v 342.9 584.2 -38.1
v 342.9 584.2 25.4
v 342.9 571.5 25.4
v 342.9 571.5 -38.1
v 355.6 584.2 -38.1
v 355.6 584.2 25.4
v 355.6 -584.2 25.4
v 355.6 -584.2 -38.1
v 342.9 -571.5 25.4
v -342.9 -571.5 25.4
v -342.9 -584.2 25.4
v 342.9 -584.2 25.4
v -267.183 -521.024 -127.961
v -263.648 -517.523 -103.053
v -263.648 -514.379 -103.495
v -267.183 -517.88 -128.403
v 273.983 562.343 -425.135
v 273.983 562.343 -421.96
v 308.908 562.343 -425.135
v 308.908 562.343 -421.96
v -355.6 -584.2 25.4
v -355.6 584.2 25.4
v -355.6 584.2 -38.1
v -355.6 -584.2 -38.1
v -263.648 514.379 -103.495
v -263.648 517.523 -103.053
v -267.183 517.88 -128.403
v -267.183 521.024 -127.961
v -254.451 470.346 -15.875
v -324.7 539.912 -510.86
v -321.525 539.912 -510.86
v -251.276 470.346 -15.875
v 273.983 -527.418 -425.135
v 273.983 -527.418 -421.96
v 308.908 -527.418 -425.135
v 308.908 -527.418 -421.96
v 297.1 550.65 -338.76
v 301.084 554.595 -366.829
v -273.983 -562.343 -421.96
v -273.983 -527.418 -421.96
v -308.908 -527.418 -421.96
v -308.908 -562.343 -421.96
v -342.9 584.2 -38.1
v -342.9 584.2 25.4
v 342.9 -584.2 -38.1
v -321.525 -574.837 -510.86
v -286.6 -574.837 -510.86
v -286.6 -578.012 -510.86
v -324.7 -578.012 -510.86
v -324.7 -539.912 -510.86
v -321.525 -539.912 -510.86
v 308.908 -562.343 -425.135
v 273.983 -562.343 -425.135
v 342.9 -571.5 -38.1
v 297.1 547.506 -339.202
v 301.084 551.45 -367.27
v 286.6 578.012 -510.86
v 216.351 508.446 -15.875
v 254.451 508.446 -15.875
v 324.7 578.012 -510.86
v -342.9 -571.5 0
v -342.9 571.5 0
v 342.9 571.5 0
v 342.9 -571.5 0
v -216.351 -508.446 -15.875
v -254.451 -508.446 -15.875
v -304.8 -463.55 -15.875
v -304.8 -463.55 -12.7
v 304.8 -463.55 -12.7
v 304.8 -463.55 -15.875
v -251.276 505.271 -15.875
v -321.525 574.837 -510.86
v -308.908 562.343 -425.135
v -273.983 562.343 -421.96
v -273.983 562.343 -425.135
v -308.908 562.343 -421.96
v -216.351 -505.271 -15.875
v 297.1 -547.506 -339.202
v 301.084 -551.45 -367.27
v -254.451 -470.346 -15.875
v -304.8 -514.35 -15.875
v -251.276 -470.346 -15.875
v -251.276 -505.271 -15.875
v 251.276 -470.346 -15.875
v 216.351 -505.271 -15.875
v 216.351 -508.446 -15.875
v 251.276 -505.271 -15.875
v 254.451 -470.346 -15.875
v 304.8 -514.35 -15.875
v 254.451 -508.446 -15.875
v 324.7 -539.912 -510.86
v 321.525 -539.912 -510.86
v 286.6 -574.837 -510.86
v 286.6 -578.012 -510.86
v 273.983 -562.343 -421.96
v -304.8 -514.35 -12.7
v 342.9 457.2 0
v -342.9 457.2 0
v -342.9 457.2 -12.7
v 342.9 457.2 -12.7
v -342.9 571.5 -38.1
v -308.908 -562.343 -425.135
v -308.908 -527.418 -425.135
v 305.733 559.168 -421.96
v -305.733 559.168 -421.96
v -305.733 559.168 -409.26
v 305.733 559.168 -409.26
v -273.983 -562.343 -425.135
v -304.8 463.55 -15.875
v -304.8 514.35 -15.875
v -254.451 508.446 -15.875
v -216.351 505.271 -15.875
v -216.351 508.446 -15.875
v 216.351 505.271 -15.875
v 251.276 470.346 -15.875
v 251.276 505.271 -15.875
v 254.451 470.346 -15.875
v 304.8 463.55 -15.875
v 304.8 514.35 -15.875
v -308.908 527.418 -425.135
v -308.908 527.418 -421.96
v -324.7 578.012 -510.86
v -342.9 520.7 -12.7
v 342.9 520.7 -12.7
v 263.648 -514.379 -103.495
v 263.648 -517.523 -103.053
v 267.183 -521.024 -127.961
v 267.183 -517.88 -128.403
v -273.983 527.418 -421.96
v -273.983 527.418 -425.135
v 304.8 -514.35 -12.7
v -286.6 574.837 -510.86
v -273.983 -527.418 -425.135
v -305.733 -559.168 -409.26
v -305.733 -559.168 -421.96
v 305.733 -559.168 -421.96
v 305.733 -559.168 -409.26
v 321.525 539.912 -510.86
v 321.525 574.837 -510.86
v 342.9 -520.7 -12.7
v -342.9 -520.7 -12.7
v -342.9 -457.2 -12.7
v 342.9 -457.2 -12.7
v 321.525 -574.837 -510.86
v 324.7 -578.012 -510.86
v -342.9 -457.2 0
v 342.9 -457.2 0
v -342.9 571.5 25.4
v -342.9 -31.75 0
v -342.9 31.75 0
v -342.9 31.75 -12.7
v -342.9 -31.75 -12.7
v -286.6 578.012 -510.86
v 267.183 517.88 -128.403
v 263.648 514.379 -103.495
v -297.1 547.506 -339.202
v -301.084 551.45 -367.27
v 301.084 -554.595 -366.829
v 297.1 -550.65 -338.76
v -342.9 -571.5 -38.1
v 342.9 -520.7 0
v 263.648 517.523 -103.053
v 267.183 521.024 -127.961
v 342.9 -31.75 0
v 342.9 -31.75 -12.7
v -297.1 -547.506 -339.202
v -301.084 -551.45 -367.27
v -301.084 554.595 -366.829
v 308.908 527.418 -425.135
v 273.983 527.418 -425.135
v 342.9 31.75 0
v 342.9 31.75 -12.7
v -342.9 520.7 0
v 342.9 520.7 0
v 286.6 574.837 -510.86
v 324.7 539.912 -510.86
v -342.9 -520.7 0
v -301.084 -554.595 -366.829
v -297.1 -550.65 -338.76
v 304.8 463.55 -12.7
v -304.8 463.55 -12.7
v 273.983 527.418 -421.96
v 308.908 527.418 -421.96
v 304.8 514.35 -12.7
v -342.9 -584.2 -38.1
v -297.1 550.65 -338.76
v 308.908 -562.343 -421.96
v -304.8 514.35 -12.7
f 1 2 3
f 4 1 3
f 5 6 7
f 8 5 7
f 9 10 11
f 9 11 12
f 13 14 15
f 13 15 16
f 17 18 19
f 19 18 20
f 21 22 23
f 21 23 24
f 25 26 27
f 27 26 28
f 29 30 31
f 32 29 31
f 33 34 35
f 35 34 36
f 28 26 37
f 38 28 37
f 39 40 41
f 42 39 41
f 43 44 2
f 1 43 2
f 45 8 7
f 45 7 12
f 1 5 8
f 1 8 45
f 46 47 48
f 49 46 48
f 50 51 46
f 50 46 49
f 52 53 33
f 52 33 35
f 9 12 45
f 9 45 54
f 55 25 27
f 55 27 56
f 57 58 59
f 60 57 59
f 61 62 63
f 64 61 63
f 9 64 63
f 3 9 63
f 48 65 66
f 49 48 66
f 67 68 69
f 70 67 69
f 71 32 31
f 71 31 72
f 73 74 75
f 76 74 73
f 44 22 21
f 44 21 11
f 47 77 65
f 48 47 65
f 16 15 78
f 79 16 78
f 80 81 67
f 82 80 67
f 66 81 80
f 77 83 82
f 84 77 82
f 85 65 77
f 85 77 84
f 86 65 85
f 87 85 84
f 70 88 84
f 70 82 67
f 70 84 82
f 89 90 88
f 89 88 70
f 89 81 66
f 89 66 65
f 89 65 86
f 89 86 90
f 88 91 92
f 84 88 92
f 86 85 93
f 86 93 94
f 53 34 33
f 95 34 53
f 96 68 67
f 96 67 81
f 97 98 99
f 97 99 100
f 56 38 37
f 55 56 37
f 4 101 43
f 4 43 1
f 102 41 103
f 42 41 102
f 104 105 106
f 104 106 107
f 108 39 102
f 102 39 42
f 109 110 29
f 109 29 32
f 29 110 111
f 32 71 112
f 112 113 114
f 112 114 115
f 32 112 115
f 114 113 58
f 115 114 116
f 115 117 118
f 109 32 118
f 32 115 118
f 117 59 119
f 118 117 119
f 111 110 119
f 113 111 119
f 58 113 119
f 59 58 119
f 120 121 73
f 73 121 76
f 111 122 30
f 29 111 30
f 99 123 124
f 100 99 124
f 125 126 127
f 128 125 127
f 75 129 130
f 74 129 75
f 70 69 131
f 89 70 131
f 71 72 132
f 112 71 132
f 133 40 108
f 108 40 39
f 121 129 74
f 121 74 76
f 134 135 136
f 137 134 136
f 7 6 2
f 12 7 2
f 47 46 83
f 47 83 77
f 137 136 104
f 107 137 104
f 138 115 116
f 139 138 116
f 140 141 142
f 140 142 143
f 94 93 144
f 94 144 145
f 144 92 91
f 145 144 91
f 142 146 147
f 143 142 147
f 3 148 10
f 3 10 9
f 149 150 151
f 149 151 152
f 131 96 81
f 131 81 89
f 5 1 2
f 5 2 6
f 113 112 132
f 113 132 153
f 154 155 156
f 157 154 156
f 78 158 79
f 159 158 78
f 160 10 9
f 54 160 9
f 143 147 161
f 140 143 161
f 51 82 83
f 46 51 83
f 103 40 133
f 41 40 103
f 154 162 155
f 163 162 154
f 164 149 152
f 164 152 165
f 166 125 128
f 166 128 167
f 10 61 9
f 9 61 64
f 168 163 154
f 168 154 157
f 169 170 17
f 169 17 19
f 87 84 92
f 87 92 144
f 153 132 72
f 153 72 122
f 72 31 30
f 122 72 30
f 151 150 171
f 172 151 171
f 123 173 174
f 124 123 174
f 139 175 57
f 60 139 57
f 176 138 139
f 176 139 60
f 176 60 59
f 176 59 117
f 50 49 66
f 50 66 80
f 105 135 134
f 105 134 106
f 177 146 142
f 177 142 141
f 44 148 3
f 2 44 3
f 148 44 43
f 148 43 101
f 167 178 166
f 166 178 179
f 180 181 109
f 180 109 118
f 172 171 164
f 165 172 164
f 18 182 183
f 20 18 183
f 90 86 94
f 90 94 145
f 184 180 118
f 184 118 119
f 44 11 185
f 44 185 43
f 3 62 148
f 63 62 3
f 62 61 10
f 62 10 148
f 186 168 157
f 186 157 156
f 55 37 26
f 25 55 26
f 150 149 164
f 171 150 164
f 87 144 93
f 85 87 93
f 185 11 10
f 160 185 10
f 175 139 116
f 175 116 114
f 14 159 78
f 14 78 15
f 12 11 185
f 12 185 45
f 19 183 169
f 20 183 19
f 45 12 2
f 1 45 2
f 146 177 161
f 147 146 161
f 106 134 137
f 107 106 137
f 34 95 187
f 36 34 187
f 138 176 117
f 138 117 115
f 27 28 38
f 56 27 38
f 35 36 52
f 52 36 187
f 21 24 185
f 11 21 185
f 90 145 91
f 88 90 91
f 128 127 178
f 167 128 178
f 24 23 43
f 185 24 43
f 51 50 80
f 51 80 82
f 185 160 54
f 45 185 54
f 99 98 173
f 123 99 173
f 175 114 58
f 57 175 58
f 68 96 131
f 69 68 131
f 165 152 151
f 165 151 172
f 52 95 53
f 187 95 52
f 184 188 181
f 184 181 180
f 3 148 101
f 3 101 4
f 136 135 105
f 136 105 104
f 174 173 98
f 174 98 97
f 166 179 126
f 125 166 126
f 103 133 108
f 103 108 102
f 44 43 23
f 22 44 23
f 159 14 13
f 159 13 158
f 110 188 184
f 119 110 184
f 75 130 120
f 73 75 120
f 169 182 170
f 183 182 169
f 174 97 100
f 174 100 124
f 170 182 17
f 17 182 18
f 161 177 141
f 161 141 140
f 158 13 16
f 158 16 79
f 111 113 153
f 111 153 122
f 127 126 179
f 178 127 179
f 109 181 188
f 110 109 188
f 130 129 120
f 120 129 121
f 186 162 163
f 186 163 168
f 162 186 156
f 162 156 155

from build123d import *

# Parameters (mm, degrees)
F0_W      = 685.8
F0_H      = 1143
F1_DEPTH  = 25.4
F2_W      = 685.8
F2_H      = 12.7
F3_DEPTH  = 63.5
F4_DEPTH  = 63.5
F7_W      = 685.8
F7_H      = 63.5
F8_DEPTH  = 12.7
F13_W     = 609.6
F13_H     = 50.8
F14_DEPTH = 3.175
F18_DEPTH = 3.175
F21_W     = 34.925
F21_H     = 34.925
F22_DEPTH = 3.175
F25_W     = 611.4661372068
F25_H     = 1118.335616345
F26_DEPTH = 12.7


# Not quite as in the source:
# - a feature of the source that left no trace in its solid (it failed there, or was rolled back) is left out


with BuildPart() as f1:
    # F0 (on Top) → F1 (new body)
    with BuildSketch(Plane.XY):
        Rectangle(F0_W, F0_H)
    extrude(amount=F1_DEPTH)


with BuildPart() as f3:
    # F2 (on face) → F3 (new body)
    with BuildSketch(Plane.XY.offset(25.4)):
        with Locations((0, -577.85)):
            Rectangle(F2_W, F2_H)
    extrude(amount=-F3_DEPTH)


with BuildPart() as f4:
    # F2 (on face) → F4 (new body)
    with BuildSketch(Plane.XY.offset(25.4)):
        Polygon((-342.9, -584.2), (-342.9, -571.5), (-342.9, 571.5), (-342.9, 584.2), (-355.6, 584.2), (-355.6, -584.2), align=None)
    extrude(amount=-F4_DEPTH)


with BuildPart() as f5_1:
    # F5: instance of F4
    add(f4.part.mirror(Plane.YZ))


with BuildPart() as f6_1:
    # F6: instance of F3
    add(f3.part.mirror(Plane.XZ))


with BuildPart() as f8:
    # F7 (on face) → F8 (new body)
    with BuildSketch(Plane(origin=(0, 0, 0), x_dir=(1, 0, 0), z_dir=(0, 0, -1))):
        with Locations((0, 488.95)):
            Rectangle(F7_W, F7_H)
    extrude(amount=F8_DEPTH)


with BuildPart() as f8b:
    # F7 (on face) → F8, piece 2 (new body)
    with BuildSketch(Plane(origin=(0, 0, 0), x_dir=(1, 0, 0), z_dir=(0, 0, -1))):
        Rectangle(F7_W, F7_H)
    extrude(amount=F8_DEPTH)


with BuildPart() as f12:
    # F12: sweep along a path in F11
    with BuildLine(Plane(origin=(0, -496.4101735589, 69.7659001467), x_dir=(1, 0, 0), z_dir=(0, -0.9902680687, 0.139173101))) as f12_path:
        Line((-254, -83.2763397607), (-324.6999352877, -586.3325186814))
    # F9 (on face) → F12 (sweep)
    with BuildSketch(Plane(origin=(0, 0, -12.7), x_dir=(1, 0, 0), z_dir=(0, 0, -1))):
        Polygon((-254, 508), (-254, 469.9), (-250.825, 469.9), (-250.825, 504.825), (-215.9, 504.825), (-215.9, 508), align=None)
    sweep(path=f12_path.line)

    # F13 (on face) → F14 (join)
    with BuildSketch(Plane(origin=(0, 0, -12.7), x_dir=(1, 0, 0), z_dir=(0, 0, -1))):
        with Locations((0, 488.95)):
            Rectangle(F13_W, F13_H)
    extrude(amount=F14_DEPTH)

    # F16: F12 across plane


with BuildPart() as f12_1:
    add(f12.part)
    add(f12.part.mirror(Plane.YZ))


with BuildPart() as f18:
    # F17 (on face) → F18 (new body)
    with BuildSketch(Plane(origin=(0, -493.2966706166, 69.3283258444), x_dir=(-1, 0, 0), z_dir=(0, 0.9902680687, -0.139173101))):
        Polygon((297.1001110228, -412.0989890367), (-263.6480910569, -174.0754990191), (-267.1830878213, -199.2283079651), (301.0836328718, -440.4432197893), align=None)
    extrude(amount=F18_DEPTH)


with BuildPart() as f19_1:
    # F19: instance of F18
    add(f18.part.mirror(Plane.YZ))


with BuildPart() as f22:
    # F21 (on offset) → F22 (new body)
    with BuildSketch(Plane(origin=(0, 0, -421.9604707683), x_dir=(1, 0, 0), z_dir=(0, 0, -1))):
        with Locations((291.4455686034, 544.8803081725)):
            Rectangle(F21_W, F21_H)
    extrude(amount=F22_DEPTH)


with BuildPart() as f23_1:
    # F23: instance of F22
    add(f22.part.mirror(Plane.YZ))


with BuildPart() as f24_1:
    # F24: instance of F8
    add(f8.part.mirror(Plane.XZ))


with BuildPart() as f24_2:
    # F24: instance of F12
    add(f12_1.part.mirror(Plane.XZ))


with BuildPart() as f24_3:
    # F24: instance of F19_1
    add(f19_1.part.mirror(Plane.XZ))


with BuildPart() as f24_4:
    # F24: instance of F18
    add(f18.part.mirror(Plane.XZ))


with BuildPart() as f24_5:
    # F24: instance of F23_1
    add(f23_1.part.mirror(Plane.XZ))


with BuildPart() as f24_6:
    # F24: instance of F22
    add(f22.part.mirror(Plane.XZ))


with BuildPart() as f26:
    # F25 (on face) → F26 (new body)
    with BuildSketch(Plane.XY.offset(-421.9604707683)):
        Rectangle(F25_W, F25_H)
    extrude(amount=F26_DEPTH)


solid = Compound([f1.part, f3.part, f4.part, f5_1.part, f6_1.part, f8.part, f8b.part, f12_1.part, f18.part, f19_1.part, f22.part, f23_1.part, f24_1.part, f24_2.part, f24_3.part, f24_4.part, f24_5.part, f24_6.part, f26.part])
